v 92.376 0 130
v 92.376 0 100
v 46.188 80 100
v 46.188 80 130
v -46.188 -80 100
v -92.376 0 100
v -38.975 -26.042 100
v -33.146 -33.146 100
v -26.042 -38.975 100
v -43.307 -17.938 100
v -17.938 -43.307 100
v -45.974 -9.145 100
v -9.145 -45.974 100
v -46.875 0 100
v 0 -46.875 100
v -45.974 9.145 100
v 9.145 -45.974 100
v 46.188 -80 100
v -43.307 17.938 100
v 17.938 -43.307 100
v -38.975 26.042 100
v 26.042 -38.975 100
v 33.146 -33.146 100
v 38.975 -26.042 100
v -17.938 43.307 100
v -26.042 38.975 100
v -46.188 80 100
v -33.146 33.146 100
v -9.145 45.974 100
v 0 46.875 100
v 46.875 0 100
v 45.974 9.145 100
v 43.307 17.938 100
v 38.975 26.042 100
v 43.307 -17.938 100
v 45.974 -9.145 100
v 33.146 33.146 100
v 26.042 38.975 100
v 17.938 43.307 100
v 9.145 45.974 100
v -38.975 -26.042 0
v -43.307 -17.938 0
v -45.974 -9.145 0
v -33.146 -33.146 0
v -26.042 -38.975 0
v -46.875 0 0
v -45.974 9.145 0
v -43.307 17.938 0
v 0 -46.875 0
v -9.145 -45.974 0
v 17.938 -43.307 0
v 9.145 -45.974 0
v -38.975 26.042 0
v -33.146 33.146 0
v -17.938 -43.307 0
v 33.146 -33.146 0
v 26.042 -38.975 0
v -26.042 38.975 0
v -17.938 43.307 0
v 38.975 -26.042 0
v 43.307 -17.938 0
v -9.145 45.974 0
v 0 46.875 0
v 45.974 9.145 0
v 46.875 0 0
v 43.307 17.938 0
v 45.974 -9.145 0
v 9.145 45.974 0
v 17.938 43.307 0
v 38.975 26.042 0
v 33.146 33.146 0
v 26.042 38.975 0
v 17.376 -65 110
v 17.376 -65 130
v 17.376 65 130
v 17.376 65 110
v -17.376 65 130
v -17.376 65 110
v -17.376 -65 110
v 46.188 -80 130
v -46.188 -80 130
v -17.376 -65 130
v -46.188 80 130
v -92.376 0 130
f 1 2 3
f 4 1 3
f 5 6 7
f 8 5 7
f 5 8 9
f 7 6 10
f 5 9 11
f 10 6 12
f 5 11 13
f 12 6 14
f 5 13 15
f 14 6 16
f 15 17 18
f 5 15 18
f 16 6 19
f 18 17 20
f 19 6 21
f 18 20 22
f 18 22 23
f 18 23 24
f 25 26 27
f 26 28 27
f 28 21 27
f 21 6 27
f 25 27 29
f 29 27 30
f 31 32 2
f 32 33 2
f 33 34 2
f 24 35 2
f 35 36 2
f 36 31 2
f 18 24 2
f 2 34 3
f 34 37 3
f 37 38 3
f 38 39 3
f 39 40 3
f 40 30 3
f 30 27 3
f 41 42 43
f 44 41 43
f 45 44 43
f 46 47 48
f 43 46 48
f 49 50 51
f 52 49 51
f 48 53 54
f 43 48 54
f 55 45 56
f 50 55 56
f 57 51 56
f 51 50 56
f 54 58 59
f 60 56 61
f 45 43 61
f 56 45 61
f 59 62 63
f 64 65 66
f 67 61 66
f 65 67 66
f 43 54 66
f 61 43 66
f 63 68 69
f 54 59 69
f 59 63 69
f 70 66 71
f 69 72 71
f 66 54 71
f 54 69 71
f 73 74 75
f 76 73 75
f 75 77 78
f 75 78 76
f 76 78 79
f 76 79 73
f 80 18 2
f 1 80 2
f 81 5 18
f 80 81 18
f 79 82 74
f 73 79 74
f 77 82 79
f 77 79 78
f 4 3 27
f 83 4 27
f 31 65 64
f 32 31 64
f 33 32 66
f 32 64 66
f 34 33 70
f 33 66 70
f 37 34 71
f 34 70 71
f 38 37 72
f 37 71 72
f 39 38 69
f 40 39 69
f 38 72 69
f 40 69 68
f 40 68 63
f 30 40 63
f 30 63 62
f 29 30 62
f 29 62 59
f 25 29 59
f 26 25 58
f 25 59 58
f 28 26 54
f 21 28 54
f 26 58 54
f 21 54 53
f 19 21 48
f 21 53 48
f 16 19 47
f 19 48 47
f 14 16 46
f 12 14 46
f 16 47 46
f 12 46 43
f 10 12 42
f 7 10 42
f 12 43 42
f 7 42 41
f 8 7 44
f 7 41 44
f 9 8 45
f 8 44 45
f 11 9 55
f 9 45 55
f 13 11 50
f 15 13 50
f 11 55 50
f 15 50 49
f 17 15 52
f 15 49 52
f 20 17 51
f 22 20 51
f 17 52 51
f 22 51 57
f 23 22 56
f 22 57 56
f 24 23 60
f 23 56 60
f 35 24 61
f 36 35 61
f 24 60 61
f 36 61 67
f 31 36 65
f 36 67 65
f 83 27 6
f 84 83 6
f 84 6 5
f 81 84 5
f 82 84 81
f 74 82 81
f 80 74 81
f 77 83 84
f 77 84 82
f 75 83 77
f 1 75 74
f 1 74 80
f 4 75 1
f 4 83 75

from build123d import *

# Parameters (mm, degrees)
SKETCH1_R           = 46.875
BOSS_EXTRUDE1_DEPTH = 100
BOSS_EXTRUDE2_DEPTH = 30
SKETCH3_W           = 34.75208614
SKETCH3_H           = 130
CUT_EXTRUDE1_DEPTH  = 20


with BuildPart() as part:
    # Sketch1 → Boss-Extrude1 (new body)
    with BuildSketch(Plane.XY):
        Circle(SKETCH1_R)
    extrude(amount=BOSS_EXTRUDE1_DEPTH)

    # Sketch2 → Boss-Extrude2 (add)
    with BuildSketch(Plane.XY.offset(100)):
        Polygon((92.37604307, 0), (46.188021535, 80), (-46.188021535, 80), (-92.37604307, 0), (-46.188021535, -80), (46.188021535, -80), align=None)
    extrude(amount=BOSS_EXTRUDE2_DEPTH)

    # Sketch3 → Cut-Extrude1 (cut)
    with BuildSketch(Plane.XY.offset(130)):
        Rectangle(SKETCH3_W, SKETCH3_H)
    extrude(amount=-CUT_EXTRUDE1_DEPTH, mode=Mode.SUBTRACT)


solid = part.part
